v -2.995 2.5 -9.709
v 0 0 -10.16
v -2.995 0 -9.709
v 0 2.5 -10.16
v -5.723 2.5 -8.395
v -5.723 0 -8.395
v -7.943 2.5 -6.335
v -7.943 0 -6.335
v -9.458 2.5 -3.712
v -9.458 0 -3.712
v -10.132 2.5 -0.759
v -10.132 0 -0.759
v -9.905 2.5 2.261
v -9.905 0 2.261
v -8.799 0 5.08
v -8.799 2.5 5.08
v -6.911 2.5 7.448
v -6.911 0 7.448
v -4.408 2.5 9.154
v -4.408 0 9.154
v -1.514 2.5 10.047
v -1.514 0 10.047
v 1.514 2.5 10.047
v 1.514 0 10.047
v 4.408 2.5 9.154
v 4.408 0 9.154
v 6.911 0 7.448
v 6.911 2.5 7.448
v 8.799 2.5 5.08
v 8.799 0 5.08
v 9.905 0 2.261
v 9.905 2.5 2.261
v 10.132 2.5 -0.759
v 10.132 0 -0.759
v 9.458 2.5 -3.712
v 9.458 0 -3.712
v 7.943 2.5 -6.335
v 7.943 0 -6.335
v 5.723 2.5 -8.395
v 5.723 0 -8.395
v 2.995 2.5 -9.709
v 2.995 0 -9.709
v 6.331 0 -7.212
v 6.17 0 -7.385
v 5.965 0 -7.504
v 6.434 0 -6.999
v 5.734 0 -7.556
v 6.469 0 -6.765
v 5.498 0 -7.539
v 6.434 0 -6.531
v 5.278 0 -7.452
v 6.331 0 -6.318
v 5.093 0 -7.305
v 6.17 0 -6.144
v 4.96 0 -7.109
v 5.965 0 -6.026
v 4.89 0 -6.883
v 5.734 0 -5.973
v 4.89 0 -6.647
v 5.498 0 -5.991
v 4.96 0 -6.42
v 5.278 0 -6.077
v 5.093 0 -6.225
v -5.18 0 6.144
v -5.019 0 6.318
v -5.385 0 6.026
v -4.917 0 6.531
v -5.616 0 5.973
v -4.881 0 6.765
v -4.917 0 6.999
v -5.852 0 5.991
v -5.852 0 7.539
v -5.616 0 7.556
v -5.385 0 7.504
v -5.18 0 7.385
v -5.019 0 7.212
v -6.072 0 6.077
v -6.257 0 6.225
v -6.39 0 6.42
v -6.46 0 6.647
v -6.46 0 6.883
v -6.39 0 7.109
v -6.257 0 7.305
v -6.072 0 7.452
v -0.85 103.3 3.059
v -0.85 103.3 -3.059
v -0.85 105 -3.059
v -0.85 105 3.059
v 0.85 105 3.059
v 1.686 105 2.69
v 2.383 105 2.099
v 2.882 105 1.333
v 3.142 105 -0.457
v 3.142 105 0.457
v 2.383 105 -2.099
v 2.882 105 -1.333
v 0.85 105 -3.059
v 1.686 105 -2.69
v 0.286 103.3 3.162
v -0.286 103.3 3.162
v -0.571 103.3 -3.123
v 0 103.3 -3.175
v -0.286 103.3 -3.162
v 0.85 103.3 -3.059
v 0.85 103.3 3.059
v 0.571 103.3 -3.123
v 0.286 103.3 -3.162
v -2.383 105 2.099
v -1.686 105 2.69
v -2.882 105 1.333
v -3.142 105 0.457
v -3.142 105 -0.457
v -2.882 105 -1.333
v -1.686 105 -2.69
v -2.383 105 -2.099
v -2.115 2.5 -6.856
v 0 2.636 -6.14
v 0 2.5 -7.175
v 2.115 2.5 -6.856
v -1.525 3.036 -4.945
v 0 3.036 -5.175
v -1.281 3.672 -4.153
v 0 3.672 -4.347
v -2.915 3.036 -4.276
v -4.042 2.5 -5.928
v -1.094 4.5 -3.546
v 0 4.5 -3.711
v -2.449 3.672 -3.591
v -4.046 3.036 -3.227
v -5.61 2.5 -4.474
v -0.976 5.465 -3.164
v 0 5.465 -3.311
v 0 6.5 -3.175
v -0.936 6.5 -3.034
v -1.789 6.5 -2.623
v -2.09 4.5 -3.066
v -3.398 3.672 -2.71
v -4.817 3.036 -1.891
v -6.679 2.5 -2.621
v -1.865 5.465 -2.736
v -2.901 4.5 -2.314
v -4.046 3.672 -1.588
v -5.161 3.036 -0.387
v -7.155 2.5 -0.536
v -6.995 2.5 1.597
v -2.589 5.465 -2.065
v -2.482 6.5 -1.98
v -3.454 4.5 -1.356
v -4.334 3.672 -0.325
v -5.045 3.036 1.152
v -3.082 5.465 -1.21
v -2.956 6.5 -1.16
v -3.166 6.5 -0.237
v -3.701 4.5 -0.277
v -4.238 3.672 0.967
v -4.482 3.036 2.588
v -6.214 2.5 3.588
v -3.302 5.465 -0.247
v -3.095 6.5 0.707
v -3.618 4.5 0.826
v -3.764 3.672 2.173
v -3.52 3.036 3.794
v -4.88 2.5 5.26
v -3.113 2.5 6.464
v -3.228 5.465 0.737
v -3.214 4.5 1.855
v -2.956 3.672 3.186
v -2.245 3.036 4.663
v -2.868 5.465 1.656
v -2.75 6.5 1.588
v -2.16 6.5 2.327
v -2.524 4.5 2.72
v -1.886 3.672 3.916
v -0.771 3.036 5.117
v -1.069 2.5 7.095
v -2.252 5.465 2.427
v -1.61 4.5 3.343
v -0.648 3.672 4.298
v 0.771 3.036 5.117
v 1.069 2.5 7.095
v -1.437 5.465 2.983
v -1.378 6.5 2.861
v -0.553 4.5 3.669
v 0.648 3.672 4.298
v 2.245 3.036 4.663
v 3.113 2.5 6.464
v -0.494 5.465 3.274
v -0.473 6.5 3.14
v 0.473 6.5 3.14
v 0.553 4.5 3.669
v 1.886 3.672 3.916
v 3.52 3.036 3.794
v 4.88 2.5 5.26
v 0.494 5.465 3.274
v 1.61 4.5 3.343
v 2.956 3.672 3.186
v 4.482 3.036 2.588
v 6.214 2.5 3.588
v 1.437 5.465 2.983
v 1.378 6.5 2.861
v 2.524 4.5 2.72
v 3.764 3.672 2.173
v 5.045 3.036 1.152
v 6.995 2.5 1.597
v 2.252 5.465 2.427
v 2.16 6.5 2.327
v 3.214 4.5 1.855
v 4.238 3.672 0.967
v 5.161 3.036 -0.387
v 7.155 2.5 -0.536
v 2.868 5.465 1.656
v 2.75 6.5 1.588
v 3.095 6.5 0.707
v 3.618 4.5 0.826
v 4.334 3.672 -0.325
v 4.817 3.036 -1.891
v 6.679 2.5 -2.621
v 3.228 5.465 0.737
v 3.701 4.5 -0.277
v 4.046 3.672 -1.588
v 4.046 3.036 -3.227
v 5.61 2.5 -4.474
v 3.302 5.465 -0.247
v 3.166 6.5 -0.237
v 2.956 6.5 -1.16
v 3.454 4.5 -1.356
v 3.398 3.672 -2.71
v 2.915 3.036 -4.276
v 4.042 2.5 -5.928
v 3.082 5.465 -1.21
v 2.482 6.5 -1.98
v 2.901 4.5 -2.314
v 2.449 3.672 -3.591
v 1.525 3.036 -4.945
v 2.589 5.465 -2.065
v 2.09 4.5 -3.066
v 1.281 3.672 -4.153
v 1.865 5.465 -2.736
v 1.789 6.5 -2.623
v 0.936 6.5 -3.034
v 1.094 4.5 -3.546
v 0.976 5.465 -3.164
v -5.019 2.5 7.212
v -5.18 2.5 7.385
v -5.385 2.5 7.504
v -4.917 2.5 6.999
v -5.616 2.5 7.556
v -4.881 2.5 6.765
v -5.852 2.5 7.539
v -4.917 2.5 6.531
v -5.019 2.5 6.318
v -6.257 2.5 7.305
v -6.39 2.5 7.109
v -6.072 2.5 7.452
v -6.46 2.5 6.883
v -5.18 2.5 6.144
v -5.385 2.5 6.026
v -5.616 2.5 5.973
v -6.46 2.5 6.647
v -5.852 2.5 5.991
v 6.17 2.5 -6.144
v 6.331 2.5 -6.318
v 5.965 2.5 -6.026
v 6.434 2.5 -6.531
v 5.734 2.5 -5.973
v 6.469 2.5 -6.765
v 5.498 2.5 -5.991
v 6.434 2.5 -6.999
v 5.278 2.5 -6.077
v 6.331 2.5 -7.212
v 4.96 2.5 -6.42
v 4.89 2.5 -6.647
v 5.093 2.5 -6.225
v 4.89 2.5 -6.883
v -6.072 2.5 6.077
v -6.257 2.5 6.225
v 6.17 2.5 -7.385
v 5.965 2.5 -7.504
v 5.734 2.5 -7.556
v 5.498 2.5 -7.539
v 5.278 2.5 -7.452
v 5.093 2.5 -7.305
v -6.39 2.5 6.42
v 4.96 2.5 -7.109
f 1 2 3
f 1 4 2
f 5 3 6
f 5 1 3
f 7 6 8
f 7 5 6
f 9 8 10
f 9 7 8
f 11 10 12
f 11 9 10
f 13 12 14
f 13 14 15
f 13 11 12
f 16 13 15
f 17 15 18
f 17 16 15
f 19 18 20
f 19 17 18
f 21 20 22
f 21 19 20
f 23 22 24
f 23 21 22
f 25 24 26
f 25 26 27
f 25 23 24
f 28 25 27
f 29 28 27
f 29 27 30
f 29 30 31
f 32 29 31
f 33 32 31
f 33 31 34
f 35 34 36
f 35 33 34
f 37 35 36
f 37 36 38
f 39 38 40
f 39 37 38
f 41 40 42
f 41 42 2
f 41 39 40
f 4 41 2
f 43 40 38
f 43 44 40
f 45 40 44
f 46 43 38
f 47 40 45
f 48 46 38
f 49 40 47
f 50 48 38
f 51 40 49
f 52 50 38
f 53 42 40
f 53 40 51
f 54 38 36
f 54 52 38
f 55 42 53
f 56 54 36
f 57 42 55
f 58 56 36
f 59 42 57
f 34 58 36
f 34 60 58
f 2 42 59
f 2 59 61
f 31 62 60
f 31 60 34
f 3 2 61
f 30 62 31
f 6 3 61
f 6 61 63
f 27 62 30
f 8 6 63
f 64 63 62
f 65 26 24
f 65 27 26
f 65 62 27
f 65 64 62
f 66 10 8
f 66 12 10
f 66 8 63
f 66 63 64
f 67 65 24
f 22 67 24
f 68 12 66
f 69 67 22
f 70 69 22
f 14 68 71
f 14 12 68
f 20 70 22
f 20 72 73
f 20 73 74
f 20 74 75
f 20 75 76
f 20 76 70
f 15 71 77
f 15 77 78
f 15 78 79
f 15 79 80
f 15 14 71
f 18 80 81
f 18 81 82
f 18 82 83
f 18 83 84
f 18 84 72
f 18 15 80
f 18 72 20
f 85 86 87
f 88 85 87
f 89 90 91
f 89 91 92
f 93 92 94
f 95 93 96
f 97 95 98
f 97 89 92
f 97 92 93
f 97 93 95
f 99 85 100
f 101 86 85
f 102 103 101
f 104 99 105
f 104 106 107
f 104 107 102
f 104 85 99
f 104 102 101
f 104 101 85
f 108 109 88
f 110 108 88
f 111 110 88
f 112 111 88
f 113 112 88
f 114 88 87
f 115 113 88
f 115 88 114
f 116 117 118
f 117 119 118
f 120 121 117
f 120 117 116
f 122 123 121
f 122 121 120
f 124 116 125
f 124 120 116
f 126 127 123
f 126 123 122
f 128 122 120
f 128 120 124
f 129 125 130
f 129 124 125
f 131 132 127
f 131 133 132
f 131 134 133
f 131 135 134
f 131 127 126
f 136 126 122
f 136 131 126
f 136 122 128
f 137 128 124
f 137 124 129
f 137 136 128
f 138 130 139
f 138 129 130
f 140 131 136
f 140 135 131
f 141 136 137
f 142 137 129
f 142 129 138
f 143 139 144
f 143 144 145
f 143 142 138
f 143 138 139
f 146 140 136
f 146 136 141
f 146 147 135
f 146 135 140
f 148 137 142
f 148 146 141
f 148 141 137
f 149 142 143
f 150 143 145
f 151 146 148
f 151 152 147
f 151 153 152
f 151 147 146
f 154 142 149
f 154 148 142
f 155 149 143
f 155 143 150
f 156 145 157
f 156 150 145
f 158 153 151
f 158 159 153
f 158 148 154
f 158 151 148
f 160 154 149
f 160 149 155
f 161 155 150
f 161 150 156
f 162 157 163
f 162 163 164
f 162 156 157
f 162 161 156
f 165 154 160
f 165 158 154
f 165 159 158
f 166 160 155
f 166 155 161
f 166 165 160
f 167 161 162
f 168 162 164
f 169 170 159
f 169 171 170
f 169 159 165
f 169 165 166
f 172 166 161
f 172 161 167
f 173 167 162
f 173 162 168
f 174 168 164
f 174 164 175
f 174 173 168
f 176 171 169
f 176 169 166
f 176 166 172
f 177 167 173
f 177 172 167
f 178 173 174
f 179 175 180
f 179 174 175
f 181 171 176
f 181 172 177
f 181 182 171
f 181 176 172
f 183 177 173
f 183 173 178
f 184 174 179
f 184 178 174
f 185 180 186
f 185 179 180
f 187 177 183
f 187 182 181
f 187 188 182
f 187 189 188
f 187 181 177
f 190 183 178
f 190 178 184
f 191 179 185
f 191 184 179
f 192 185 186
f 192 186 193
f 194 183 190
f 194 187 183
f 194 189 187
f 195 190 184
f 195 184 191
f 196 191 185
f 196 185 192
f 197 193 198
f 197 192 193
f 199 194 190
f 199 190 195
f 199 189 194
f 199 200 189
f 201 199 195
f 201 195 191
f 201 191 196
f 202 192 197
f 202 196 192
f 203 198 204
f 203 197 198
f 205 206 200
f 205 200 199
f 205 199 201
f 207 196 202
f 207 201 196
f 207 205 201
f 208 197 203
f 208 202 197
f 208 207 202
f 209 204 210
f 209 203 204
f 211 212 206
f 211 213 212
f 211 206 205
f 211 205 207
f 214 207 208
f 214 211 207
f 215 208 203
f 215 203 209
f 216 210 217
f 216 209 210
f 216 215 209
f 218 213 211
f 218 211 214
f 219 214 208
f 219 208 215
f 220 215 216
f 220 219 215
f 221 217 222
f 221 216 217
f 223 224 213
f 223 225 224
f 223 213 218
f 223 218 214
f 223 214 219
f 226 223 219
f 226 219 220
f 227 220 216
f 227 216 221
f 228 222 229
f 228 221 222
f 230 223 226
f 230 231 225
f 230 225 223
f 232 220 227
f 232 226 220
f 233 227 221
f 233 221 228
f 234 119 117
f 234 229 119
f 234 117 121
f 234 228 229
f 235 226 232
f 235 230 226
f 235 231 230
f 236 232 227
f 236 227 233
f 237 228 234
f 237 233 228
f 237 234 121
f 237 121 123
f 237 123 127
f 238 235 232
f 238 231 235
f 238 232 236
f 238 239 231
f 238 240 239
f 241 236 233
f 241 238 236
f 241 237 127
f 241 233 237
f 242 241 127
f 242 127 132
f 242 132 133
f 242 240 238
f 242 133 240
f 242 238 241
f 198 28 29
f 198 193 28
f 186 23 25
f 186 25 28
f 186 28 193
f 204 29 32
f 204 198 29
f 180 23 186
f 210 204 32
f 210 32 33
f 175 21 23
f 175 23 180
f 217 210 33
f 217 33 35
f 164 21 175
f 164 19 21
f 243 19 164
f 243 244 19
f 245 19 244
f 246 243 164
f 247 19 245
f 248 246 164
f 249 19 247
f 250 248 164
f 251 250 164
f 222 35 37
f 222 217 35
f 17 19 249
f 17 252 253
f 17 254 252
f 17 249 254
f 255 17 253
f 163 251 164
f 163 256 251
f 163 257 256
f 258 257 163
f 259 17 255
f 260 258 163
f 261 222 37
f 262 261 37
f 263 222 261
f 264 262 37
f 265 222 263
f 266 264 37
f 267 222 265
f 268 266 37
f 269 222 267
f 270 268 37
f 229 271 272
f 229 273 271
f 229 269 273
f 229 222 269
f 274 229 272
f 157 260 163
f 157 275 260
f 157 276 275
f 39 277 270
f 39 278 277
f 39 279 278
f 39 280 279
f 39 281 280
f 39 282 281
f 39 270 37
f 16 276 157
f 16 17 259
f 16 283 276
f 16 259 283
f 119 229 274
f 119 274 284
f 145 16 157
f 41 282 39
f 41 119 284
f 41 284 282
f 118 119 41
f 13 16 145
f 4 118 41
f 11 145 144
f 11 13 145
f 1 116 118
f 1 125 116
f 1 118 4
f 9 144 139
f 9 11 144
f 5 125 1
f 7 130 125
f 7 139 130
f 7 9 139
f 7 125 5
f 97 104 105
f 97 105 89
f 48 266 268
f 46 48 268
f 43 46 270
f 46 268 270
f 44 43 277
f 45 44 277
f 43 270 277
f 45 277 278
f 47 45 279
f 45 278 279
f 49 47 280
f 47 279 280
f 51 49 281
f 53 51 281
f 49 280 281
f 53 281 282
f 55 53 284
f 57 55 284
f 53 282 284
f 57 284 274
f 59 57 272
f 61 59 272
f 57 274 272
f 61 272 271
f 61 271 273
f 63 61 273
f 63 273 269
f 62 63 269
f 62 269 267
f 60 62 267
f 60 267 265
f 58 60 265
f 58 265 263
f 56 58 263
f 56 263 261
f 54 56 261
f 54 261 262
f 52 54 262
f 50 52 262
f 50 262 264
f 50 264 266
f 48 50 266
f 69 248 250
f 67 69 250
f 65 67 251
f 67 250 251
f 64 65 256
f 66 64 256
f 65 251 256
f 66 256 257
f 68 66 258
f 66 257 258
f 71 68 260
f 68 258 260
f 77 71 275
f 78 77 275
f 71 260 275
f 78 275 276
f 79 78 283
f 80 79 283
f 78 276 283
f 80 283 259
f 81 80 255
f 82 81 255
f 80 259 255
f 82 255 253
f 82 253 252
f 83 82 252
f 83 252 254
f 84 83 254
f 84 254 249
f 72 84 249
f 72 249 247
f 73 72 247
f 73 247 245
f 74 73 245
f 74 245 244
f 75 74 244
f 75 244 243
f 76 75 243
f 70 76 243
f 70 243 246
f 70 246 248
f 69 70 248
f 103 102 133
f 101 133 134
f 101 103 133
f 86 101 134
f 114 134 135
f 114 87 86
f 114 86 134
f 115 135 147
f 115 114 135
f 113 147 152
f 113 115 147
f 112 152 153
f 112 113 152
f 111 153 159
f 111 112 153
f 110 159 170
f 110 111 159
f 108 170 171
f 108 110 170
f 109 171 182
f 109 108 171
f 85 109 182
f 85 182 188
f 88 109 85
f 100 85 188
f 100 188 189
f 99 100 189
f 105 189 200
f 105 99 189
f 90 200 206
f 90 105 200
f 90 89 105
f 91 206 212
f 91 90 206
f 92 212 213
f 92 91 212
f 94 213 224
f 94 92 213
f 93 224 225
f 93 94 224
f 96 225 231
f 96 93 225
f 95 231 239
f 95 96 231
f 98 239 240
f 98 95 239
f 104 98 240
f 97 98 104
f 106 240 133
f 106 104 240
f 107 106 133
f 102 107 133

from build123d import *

# Parameters (mm, degrees)
FILLET1_R                       = 4
CUT_EXTRUDE3_DEPTH              = 106.978541224
CUT_EXTRUDE3_DEPTH_BACK         = 106.978541224
SKETCH4_W                       = 1.7
SKETCH4_H                       = 1.7
F_1_16_0_0625_DOWEL_HOLE1_D     = 1.5875
F_1_16_0_0625_DOWEL_HOLE1_DEPTH = 6
F_1_16_0_0625_DOWEL_HOLE1_TIP   = 0.476933116


with BuildPart() as part:
    # Sketch1 → Revolve1 (revolve)
    with BuildSketch(Plane.XY, mode=Mode.PRIVATE) as revolve1_sk:
        Polygon((0, 0), (10.16, 0), (10.16, 2.5), (3.175, 2.5), (3.175, 105), (0, 105), align=None)
    revolve(revolve1_sk.sketch.rotate(Axis((0, -31.831703756, 0), (0, 1, 0)), 90), axis=Axis((0, -31.831703756, 0), (0, 1, 0)))

    # Fillet1
    fillet1_edges = [part.edges().sort_by_distance(p)[0] for p in [
        (0, 2.5, 3.175),
    ]]
    fillet(fillet1_edges, radius=FILLET1_R)

    # Sketch4 → Cut-Extrude3 (cut, two sides: drawn at the far end of the back side and taken through both)
    with BuildSketch(Plane.XY.offset(-CUT_EXTRUDE3_DEPTH_BACK)):
        with Locations((0, 104.15)):
            Rectangle(SKETCH4_W, SKETCH4_H)
    extrude(amount=CUT_EXTRUDE3_DEPTH + CUT_EXTRUDE3_DEPTH_BACK, mode=Mode.SUBTRACT)

    # 1/16 (0.0625) Dowel Hole1
    with Locations(Plane(origin=(0, 0, 0), x_dir=(-1, 0, 0), z_dir=(0, -1, 0))):
        with Locations((5.675039265, -6.764822935), (-5.675039265, 6.764822935)):
            Hole(F_1_16_0_0625_DOWEL_HOLE1_D / 2, depth=F_1_16_0_0625_DOWEL_HOLE1_DEPTH)
            with Locations((0, 0, -(F_1_16_0_0625_DOWEL_HOLE1_DEPTH + F_1_16_0_0625_DOWEL_HOLE1_TIP / 2))):  # 118° drill point
                Cone(0, F_1_16_0_0625_DOWEL_HOLE1_D / 2, F_1_16_0_0625_DOWEL_HOLE1_TIP, mode=Mode.SUBTRACT)


solid = part.part
